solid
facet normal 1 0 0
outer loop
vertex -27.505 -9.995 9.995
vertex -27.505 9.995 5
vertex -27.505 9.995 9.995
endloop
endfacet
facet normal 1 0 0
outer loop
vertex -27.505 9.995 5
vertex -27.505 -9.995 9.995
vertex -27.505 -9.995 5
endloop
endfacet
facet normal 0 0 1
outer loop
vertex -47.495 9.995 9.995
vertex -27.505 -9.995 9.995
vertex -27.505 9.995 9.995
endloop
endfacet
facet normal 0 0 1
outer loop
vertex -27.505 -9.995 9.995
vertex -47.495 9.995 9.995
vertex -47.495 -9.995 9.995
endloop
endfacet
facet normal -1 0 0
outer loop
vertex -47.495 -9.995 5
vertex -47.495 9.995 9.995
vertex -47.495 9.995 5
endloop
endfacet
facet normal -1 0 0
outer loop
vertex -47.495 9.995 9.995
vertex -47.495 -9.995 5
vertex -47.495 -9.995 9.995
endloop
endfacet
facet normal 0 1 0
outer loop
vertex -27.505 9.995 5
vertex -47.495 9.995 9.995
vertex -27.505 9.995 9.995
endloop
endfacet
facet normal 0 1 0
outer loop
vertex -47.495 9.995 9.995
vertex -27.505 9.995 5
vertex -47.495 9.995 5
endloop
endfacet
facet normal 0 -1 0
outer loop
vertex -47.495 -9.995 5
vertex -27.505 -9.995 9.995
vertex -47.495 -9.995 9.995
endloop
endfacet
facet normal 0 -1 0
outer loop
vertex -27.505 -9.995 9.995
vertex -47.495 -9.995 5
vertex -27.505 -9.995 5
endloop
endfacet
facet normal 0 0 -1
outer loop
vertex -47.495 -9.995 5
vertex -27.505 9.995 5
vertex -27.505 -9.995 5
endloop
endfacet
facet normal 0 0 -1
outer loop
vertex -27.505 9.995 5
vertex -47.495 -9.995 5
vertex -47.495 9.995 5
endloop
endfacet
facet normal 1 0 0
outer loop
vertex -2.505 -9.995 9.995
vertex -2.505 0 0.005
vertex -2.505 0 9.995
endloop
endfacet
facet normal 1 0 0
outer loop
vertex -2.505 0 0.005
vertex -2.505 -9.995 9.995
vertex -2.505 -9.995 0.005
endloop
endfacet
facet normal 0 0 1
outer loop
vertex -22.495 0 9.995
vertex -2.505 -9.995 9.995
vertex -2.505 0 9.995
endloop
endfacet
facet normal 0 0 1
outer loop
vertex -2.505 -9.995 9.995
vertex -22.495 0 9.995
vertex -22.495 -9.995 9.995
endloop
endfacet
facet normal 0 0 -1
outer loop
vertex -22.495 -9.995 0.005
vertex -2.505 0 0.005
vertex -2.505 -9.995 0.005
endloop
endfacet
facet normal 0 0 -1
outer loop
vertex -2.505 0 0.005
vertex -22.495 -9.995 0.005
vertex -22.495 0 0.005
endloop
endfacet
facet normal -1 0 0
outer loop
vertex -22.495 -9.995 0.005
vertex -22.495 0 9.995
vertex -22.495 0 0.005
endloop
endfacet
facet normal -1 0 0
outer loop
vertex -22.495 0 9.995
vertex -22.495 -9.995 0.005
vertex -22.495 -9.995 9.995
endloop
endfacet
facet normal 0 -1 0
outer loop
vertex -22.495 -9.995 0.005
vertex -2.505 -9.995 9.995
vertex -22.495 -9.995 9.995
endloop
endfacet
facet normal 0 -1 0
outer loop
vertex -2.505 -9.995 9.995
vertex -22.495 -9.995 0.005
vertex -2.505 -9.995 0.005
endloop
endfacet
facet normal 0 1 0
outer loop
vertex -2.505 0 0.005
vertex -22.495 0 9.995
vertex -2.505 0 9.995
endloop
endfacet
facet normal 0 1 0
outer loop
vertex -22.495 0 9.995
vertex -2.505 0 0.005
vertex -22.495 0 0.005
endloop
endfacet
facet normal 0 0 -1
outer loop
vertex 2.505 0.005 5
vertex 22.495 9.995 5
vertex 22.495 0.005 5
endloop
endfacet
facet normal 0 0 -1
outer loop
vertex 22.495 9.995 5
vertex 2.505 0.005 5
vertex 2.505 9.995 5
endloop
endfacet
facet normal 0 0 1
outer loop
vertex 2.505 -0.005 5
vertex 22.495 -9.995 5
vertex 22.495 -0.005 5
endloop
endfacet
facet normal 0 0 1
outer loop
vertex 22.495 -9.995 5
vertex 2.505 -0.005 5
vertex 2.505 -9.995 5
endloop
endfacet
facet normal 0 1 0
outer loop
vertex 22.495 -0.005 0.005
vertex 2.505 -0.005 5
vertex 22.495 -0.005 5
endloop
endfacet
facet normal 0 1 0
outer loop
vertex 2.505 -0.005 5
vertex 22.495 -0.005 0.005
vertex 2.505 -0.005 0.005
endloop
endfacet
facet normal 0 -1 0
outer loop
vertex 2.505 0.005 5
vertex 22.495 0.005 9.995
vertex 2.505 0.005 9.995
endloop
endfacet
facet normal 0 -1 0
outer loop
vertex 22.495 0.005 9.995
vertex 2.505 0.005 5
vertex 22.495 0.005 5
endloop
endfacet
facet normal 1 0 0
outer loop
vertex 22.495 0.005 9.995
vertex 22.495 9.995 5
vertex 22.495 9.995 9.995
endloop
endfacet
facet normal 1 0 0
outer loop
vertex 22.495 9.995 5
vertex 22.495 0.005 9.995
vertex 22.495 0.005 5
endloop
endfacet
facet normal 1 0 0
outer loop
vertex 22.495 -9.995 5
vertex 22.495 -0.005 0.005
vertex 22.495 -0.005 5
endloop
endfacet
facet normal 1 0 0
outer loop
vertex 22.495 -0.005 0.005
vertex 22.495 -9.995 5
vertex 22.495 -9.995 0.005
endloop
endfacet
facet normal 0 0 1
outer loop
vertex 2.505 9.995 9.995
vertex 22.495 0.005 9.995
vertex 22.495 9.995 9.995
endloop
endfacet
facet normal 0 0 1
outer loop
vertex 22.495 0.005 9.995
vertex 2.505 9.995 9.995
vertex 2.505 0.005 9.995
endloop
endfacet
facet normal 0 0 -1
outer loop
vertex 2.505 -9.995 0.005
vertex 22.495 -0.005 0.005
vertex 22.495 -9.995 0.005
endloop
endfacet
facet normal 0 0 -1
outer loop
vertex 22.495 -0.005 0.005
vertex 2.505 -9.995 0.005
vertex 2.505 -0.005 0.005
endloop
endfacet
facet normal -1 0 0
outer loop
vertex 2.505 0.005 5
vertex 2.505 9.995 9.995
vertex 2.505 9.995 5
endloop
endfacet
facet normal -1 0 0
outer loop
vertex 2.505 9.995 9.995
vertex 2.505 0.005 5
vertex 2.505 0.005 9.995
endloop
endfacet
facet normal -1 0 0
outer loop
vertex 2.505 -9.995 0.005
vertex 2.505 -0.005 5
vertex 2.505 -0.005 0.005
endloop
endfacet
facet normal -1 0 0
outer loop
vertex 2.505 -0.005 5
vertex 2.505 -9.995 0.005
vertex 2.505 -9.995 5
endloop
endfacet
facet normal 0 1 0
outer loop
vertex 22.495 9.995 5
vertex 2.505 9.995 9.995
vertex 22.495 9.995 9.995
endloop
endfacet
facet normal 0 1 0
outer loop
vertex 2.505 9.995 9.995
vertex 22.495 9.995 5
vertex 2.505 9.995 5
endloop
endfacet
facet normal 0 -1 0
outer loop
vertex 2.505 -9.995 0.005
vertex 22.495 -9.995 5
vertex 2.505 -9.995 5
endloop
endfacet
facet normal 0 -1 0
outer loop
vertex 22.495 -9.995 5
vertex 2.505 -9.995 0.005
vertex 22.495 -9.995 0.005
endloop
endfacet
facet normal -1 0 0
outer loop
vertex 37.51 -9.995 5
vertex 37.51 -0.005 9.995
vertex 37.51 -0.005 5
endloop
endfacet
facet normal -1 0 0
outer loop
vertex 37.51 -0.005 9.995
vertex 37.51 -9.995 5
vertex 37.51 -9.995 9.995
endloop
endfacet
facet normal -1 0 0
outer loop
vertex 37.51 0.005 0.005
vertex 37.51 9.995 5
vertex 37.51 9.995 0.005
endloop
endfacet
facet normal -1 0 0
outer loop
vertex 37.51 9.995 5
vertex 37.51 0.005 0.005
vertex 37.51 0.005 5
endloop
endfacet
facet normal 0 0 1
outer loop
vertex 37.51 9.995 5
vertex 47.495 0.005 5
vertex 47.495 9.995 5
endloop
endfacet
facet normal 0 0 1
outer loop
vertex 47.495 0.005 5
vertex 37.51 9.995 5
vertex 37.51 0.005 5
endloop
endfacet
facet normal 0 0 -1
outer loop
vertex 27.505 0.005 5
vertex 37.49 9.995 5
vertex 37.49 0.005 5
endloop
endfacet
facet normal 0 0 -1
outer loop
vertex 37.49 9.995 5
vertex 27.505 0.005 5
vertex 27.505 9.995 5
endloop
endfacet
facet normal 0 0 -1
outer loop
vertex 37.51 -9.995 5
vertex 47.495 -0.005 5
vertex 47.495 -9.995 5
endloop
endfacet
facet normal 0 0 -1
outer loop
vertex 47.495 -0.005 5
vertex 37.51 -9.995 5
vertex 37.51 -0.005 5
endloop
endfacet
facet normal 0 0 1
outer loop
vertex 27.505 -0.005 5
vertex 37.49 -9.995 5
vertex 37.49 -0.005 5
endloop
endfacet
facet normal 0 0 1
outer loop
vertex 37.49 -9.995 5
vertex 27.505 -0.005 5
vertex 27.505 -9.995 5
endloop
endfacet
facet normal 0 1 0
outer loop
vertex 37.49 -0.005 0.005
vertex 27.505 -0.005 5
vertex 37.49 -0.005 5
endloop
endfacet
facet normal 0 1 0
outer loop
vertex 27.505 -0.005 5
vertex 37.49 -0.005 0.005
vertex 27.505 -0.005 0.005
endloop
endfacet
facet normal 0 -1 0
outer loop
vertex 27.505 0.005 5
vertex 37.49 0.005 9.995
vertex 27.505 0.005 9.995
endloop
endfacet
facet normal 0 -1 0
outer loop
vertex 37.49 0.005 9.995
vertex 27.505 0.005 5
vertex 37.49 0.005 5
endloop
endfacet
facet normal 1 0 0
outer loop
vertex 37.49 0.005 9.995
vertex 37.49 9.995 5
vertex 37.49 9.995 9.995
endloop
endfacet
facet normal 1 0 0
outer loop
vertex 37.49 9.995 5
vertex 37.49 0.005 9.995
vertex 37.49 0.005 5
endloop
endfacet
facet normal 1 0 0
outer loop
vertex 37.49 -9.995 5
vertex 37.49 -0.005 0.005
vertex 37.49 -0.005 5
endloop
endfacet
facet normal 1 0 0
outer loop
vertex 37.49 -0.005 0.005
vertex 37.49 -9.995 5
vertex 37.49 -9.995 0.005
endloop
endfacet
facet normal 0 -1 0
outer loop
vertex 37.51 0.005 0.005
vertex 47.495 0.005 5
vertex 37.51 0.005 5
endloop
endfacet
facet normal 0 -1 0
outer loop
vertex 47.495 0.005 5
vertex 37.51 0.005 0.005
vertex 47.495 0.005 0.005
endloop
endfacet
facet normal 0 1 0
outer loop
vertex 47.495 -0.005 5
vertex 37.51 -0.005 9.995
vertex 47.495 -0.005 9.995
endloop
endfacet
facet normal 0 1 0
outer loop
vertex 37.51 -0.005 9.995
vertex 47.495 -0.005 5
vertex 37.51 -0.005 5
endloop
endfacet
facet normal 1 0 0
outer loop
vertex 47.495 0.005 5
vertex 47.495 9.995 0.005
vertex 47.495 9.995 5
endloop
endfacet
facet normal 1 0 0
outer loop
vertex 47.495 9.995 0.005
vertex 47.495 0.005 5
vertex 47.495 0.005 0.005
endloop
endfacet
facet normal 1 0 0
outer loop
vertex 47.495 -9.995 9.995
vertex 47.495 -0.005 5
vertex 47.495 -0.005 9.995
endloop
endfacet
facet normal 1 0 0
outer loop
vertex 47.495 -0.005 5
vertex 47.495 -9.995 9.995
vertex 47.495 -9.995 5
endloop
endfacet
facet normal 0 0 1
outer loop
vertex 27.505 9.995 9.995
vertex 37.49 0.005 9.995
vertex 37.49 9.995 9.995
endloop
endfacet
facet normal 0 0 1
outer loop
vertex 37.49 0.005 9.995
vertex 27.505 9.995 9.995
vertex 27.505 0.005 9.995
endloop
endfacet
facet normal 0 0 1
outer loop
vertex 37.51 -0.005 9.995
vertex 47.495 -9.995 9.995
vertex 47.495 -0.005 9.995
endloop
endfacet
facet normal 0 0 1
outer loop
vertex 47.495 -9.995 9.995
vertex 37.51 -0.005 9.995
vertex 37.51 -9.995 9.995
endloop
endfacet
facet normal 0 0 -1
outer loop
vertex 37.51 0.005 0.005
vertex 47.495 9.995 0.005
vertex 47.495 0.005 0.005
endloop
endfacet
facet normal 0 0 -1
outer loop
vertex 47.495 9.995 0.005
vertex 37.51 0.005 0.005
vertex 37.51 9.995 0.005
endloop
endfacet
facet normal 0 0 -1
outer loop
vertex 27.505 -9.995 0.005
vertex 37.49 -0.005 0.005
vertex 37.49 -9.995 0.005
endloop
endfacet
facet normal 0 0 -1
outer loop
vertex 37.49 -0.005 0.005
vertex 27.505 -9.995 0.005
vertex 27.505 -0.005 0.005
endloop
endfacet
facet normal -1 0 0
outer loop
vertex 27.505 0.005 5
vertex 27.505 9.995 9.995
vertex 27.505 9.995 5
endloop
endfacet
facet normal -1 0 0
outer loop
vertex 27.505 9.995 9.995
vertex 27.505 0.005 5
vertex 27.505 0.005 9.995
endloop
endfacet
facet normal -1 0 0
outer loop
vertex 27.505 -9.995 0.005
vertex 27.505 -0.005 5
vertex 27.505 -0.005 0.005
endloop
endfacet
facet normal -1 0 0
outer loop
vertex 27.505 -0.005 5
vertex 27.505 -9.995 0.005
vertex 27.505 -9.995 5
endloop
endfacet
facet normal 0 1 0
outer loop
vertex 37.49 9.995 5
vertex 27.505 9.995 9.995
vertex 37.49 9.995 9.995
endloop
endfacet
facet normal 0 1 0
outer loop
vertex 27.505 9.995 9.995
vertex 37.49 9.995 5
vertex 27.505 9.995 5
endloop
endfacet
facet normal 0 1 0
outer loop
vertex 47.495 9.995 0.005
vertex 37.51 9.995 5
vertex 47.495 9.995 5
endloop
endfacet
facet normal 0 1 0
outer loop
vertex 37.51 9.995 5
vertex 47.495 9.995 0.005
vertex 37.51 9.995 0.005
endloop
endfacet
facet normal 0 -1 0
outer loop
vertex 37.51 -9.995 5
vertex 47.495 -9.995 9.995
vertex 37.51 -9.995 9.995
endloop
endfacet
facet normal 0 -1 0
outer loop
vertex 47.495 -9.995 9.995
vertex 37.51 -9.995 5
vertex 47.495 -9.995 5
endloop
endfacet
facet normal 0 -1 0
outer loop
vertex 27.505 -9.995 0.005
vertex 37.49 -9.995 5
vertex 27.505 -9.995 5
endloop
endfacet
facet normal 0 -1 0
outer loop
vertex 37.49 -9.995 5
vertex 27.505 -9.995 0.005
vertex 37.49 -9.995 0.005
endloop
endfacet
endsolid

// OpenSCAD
/*
run with batch file:
..\openscad -s cube1_a.stl -D "cubeType = 1" -D "producePartA = 1" -D "inBatchMode = true" TCCC.scad
..\openscad -s cube1_b.stl -D "cubeType = 1" -D "producePartA = 0" -D "inBatchMode = true" TCCC.scad
..\openscad -s cube2_a.stl -D "cubeType = 2" -D "producePartA = 1" -D "inBatchMode = true" TCCC.scad
..\openscad -s cube2_b.stl -D "cubeType = 2" -D "producePartA = 0" -D "inBatchMode = true" TCCC.scad
..\openscad -s cube3_a.stl -D "cubeType = 3" -D "producePartA = 1" -D "inBatchMode = true" TCCC.scad
..\openscad -s cube3_b.stl -D "cubeType = 3" -D "producePartA = 0" -D "inBatchMode = true" TCCC.scad
..\openscad -s cube4_a.stl -D "cubeType = 4" -D "producePartA = 1" -D "inBatchMode = true" TCCC.scad
..\openscad -s cube4_b.stl -D "cubeType = 4" -D "producePartA = 0" -D "inBatchMode = true" TCCC.scad
*/

module calibCube2(thisIsPartA=true) {
	if (thisIsPartA) echo("parta");
	translate([0,0,thisIsPartA?7.5:2.5])cube([20,20,5],center=true);
}
module calibCube3(thisIsPartA=true) {
	translate([0,thisIsPartA?-5:5,5])cube([20,10,10],center=true);
}
module calibCube4(thisIsPartA=true) {
	translate([0,thisIsPartA?-5:5,2.5])cube([20,10.01,5],center=true);
	translate([0,thisIsPartA?5:-5,7.5])cube([20,10.01,5],center=true);
}
module calibCube5(thisIsPartA=true) {
	translate([-5,0,0])scale([0.501,1,1])calibCube4(thisIsPartA);
	translate([5,0,0])scale([0.501,1,1])calibCube4(!thisIsPartA);
}

cubeType=1;
producePartA=1;

module showCube(type,partA) {
	if (type==1) {
		intersection() { translate([0,0,5])cube([20,20,10],center=true); difference() { translate([0,0,5])cube([19.99,19.99,9.99],center=true);calibCube2(partA); }}
	} else if (type==2) {
		intersection() { translate([0,0,5])cube([19.99,19.99,9.99],center=true); difference() { translate([0,0,5])cube([19.99,19.99,9.99],center=true);calibCube3(partA); }}
	} else if (type==3) {
		intersection() { translate([0,0,5])cube([19.99,19.99,9.99],center=true); difference() { translate([0,0,5])cube([19.99,19.99,9.99],center=true);calibCube4(partA); }}
	} else if (type==4) {
		intersection() { translate([0,0,5])cube([19.99,19.99,9.99],center=true); difference() { translate([0,0,5])cube([19.99,19.99,9.99],center=true);calibCube5(partA); }}
	}
}

module twoPart(type) {
	color([0.1,0.1,0.1,1]) showCube(type,true);
	color([0.9,0.9,0.9,1]) showCube(type,false);
}

module all() {
	translate([-37.5,0,0])twoPart(1);
	translate([-12.5,0,0])twoPart(2);
	translate([12.5,0,0])twoPart(3);
	translate([37.5,0,0])twoPart(4);
}
module half(partA) {
	translate([-37.5,0,0])showCube(1,partA);
	translate([-12.5,0,0])showCube(2,partA);
	translate([12.5,0,0])showCube(3,partA);
	translate([37.5,0,0])showCube(4,partA);
}

inBatchMode=false;

if (inBatchMode) {
	showCube(cubeType,producePartA==1);
} else {
//	all();
	half(false);
}
